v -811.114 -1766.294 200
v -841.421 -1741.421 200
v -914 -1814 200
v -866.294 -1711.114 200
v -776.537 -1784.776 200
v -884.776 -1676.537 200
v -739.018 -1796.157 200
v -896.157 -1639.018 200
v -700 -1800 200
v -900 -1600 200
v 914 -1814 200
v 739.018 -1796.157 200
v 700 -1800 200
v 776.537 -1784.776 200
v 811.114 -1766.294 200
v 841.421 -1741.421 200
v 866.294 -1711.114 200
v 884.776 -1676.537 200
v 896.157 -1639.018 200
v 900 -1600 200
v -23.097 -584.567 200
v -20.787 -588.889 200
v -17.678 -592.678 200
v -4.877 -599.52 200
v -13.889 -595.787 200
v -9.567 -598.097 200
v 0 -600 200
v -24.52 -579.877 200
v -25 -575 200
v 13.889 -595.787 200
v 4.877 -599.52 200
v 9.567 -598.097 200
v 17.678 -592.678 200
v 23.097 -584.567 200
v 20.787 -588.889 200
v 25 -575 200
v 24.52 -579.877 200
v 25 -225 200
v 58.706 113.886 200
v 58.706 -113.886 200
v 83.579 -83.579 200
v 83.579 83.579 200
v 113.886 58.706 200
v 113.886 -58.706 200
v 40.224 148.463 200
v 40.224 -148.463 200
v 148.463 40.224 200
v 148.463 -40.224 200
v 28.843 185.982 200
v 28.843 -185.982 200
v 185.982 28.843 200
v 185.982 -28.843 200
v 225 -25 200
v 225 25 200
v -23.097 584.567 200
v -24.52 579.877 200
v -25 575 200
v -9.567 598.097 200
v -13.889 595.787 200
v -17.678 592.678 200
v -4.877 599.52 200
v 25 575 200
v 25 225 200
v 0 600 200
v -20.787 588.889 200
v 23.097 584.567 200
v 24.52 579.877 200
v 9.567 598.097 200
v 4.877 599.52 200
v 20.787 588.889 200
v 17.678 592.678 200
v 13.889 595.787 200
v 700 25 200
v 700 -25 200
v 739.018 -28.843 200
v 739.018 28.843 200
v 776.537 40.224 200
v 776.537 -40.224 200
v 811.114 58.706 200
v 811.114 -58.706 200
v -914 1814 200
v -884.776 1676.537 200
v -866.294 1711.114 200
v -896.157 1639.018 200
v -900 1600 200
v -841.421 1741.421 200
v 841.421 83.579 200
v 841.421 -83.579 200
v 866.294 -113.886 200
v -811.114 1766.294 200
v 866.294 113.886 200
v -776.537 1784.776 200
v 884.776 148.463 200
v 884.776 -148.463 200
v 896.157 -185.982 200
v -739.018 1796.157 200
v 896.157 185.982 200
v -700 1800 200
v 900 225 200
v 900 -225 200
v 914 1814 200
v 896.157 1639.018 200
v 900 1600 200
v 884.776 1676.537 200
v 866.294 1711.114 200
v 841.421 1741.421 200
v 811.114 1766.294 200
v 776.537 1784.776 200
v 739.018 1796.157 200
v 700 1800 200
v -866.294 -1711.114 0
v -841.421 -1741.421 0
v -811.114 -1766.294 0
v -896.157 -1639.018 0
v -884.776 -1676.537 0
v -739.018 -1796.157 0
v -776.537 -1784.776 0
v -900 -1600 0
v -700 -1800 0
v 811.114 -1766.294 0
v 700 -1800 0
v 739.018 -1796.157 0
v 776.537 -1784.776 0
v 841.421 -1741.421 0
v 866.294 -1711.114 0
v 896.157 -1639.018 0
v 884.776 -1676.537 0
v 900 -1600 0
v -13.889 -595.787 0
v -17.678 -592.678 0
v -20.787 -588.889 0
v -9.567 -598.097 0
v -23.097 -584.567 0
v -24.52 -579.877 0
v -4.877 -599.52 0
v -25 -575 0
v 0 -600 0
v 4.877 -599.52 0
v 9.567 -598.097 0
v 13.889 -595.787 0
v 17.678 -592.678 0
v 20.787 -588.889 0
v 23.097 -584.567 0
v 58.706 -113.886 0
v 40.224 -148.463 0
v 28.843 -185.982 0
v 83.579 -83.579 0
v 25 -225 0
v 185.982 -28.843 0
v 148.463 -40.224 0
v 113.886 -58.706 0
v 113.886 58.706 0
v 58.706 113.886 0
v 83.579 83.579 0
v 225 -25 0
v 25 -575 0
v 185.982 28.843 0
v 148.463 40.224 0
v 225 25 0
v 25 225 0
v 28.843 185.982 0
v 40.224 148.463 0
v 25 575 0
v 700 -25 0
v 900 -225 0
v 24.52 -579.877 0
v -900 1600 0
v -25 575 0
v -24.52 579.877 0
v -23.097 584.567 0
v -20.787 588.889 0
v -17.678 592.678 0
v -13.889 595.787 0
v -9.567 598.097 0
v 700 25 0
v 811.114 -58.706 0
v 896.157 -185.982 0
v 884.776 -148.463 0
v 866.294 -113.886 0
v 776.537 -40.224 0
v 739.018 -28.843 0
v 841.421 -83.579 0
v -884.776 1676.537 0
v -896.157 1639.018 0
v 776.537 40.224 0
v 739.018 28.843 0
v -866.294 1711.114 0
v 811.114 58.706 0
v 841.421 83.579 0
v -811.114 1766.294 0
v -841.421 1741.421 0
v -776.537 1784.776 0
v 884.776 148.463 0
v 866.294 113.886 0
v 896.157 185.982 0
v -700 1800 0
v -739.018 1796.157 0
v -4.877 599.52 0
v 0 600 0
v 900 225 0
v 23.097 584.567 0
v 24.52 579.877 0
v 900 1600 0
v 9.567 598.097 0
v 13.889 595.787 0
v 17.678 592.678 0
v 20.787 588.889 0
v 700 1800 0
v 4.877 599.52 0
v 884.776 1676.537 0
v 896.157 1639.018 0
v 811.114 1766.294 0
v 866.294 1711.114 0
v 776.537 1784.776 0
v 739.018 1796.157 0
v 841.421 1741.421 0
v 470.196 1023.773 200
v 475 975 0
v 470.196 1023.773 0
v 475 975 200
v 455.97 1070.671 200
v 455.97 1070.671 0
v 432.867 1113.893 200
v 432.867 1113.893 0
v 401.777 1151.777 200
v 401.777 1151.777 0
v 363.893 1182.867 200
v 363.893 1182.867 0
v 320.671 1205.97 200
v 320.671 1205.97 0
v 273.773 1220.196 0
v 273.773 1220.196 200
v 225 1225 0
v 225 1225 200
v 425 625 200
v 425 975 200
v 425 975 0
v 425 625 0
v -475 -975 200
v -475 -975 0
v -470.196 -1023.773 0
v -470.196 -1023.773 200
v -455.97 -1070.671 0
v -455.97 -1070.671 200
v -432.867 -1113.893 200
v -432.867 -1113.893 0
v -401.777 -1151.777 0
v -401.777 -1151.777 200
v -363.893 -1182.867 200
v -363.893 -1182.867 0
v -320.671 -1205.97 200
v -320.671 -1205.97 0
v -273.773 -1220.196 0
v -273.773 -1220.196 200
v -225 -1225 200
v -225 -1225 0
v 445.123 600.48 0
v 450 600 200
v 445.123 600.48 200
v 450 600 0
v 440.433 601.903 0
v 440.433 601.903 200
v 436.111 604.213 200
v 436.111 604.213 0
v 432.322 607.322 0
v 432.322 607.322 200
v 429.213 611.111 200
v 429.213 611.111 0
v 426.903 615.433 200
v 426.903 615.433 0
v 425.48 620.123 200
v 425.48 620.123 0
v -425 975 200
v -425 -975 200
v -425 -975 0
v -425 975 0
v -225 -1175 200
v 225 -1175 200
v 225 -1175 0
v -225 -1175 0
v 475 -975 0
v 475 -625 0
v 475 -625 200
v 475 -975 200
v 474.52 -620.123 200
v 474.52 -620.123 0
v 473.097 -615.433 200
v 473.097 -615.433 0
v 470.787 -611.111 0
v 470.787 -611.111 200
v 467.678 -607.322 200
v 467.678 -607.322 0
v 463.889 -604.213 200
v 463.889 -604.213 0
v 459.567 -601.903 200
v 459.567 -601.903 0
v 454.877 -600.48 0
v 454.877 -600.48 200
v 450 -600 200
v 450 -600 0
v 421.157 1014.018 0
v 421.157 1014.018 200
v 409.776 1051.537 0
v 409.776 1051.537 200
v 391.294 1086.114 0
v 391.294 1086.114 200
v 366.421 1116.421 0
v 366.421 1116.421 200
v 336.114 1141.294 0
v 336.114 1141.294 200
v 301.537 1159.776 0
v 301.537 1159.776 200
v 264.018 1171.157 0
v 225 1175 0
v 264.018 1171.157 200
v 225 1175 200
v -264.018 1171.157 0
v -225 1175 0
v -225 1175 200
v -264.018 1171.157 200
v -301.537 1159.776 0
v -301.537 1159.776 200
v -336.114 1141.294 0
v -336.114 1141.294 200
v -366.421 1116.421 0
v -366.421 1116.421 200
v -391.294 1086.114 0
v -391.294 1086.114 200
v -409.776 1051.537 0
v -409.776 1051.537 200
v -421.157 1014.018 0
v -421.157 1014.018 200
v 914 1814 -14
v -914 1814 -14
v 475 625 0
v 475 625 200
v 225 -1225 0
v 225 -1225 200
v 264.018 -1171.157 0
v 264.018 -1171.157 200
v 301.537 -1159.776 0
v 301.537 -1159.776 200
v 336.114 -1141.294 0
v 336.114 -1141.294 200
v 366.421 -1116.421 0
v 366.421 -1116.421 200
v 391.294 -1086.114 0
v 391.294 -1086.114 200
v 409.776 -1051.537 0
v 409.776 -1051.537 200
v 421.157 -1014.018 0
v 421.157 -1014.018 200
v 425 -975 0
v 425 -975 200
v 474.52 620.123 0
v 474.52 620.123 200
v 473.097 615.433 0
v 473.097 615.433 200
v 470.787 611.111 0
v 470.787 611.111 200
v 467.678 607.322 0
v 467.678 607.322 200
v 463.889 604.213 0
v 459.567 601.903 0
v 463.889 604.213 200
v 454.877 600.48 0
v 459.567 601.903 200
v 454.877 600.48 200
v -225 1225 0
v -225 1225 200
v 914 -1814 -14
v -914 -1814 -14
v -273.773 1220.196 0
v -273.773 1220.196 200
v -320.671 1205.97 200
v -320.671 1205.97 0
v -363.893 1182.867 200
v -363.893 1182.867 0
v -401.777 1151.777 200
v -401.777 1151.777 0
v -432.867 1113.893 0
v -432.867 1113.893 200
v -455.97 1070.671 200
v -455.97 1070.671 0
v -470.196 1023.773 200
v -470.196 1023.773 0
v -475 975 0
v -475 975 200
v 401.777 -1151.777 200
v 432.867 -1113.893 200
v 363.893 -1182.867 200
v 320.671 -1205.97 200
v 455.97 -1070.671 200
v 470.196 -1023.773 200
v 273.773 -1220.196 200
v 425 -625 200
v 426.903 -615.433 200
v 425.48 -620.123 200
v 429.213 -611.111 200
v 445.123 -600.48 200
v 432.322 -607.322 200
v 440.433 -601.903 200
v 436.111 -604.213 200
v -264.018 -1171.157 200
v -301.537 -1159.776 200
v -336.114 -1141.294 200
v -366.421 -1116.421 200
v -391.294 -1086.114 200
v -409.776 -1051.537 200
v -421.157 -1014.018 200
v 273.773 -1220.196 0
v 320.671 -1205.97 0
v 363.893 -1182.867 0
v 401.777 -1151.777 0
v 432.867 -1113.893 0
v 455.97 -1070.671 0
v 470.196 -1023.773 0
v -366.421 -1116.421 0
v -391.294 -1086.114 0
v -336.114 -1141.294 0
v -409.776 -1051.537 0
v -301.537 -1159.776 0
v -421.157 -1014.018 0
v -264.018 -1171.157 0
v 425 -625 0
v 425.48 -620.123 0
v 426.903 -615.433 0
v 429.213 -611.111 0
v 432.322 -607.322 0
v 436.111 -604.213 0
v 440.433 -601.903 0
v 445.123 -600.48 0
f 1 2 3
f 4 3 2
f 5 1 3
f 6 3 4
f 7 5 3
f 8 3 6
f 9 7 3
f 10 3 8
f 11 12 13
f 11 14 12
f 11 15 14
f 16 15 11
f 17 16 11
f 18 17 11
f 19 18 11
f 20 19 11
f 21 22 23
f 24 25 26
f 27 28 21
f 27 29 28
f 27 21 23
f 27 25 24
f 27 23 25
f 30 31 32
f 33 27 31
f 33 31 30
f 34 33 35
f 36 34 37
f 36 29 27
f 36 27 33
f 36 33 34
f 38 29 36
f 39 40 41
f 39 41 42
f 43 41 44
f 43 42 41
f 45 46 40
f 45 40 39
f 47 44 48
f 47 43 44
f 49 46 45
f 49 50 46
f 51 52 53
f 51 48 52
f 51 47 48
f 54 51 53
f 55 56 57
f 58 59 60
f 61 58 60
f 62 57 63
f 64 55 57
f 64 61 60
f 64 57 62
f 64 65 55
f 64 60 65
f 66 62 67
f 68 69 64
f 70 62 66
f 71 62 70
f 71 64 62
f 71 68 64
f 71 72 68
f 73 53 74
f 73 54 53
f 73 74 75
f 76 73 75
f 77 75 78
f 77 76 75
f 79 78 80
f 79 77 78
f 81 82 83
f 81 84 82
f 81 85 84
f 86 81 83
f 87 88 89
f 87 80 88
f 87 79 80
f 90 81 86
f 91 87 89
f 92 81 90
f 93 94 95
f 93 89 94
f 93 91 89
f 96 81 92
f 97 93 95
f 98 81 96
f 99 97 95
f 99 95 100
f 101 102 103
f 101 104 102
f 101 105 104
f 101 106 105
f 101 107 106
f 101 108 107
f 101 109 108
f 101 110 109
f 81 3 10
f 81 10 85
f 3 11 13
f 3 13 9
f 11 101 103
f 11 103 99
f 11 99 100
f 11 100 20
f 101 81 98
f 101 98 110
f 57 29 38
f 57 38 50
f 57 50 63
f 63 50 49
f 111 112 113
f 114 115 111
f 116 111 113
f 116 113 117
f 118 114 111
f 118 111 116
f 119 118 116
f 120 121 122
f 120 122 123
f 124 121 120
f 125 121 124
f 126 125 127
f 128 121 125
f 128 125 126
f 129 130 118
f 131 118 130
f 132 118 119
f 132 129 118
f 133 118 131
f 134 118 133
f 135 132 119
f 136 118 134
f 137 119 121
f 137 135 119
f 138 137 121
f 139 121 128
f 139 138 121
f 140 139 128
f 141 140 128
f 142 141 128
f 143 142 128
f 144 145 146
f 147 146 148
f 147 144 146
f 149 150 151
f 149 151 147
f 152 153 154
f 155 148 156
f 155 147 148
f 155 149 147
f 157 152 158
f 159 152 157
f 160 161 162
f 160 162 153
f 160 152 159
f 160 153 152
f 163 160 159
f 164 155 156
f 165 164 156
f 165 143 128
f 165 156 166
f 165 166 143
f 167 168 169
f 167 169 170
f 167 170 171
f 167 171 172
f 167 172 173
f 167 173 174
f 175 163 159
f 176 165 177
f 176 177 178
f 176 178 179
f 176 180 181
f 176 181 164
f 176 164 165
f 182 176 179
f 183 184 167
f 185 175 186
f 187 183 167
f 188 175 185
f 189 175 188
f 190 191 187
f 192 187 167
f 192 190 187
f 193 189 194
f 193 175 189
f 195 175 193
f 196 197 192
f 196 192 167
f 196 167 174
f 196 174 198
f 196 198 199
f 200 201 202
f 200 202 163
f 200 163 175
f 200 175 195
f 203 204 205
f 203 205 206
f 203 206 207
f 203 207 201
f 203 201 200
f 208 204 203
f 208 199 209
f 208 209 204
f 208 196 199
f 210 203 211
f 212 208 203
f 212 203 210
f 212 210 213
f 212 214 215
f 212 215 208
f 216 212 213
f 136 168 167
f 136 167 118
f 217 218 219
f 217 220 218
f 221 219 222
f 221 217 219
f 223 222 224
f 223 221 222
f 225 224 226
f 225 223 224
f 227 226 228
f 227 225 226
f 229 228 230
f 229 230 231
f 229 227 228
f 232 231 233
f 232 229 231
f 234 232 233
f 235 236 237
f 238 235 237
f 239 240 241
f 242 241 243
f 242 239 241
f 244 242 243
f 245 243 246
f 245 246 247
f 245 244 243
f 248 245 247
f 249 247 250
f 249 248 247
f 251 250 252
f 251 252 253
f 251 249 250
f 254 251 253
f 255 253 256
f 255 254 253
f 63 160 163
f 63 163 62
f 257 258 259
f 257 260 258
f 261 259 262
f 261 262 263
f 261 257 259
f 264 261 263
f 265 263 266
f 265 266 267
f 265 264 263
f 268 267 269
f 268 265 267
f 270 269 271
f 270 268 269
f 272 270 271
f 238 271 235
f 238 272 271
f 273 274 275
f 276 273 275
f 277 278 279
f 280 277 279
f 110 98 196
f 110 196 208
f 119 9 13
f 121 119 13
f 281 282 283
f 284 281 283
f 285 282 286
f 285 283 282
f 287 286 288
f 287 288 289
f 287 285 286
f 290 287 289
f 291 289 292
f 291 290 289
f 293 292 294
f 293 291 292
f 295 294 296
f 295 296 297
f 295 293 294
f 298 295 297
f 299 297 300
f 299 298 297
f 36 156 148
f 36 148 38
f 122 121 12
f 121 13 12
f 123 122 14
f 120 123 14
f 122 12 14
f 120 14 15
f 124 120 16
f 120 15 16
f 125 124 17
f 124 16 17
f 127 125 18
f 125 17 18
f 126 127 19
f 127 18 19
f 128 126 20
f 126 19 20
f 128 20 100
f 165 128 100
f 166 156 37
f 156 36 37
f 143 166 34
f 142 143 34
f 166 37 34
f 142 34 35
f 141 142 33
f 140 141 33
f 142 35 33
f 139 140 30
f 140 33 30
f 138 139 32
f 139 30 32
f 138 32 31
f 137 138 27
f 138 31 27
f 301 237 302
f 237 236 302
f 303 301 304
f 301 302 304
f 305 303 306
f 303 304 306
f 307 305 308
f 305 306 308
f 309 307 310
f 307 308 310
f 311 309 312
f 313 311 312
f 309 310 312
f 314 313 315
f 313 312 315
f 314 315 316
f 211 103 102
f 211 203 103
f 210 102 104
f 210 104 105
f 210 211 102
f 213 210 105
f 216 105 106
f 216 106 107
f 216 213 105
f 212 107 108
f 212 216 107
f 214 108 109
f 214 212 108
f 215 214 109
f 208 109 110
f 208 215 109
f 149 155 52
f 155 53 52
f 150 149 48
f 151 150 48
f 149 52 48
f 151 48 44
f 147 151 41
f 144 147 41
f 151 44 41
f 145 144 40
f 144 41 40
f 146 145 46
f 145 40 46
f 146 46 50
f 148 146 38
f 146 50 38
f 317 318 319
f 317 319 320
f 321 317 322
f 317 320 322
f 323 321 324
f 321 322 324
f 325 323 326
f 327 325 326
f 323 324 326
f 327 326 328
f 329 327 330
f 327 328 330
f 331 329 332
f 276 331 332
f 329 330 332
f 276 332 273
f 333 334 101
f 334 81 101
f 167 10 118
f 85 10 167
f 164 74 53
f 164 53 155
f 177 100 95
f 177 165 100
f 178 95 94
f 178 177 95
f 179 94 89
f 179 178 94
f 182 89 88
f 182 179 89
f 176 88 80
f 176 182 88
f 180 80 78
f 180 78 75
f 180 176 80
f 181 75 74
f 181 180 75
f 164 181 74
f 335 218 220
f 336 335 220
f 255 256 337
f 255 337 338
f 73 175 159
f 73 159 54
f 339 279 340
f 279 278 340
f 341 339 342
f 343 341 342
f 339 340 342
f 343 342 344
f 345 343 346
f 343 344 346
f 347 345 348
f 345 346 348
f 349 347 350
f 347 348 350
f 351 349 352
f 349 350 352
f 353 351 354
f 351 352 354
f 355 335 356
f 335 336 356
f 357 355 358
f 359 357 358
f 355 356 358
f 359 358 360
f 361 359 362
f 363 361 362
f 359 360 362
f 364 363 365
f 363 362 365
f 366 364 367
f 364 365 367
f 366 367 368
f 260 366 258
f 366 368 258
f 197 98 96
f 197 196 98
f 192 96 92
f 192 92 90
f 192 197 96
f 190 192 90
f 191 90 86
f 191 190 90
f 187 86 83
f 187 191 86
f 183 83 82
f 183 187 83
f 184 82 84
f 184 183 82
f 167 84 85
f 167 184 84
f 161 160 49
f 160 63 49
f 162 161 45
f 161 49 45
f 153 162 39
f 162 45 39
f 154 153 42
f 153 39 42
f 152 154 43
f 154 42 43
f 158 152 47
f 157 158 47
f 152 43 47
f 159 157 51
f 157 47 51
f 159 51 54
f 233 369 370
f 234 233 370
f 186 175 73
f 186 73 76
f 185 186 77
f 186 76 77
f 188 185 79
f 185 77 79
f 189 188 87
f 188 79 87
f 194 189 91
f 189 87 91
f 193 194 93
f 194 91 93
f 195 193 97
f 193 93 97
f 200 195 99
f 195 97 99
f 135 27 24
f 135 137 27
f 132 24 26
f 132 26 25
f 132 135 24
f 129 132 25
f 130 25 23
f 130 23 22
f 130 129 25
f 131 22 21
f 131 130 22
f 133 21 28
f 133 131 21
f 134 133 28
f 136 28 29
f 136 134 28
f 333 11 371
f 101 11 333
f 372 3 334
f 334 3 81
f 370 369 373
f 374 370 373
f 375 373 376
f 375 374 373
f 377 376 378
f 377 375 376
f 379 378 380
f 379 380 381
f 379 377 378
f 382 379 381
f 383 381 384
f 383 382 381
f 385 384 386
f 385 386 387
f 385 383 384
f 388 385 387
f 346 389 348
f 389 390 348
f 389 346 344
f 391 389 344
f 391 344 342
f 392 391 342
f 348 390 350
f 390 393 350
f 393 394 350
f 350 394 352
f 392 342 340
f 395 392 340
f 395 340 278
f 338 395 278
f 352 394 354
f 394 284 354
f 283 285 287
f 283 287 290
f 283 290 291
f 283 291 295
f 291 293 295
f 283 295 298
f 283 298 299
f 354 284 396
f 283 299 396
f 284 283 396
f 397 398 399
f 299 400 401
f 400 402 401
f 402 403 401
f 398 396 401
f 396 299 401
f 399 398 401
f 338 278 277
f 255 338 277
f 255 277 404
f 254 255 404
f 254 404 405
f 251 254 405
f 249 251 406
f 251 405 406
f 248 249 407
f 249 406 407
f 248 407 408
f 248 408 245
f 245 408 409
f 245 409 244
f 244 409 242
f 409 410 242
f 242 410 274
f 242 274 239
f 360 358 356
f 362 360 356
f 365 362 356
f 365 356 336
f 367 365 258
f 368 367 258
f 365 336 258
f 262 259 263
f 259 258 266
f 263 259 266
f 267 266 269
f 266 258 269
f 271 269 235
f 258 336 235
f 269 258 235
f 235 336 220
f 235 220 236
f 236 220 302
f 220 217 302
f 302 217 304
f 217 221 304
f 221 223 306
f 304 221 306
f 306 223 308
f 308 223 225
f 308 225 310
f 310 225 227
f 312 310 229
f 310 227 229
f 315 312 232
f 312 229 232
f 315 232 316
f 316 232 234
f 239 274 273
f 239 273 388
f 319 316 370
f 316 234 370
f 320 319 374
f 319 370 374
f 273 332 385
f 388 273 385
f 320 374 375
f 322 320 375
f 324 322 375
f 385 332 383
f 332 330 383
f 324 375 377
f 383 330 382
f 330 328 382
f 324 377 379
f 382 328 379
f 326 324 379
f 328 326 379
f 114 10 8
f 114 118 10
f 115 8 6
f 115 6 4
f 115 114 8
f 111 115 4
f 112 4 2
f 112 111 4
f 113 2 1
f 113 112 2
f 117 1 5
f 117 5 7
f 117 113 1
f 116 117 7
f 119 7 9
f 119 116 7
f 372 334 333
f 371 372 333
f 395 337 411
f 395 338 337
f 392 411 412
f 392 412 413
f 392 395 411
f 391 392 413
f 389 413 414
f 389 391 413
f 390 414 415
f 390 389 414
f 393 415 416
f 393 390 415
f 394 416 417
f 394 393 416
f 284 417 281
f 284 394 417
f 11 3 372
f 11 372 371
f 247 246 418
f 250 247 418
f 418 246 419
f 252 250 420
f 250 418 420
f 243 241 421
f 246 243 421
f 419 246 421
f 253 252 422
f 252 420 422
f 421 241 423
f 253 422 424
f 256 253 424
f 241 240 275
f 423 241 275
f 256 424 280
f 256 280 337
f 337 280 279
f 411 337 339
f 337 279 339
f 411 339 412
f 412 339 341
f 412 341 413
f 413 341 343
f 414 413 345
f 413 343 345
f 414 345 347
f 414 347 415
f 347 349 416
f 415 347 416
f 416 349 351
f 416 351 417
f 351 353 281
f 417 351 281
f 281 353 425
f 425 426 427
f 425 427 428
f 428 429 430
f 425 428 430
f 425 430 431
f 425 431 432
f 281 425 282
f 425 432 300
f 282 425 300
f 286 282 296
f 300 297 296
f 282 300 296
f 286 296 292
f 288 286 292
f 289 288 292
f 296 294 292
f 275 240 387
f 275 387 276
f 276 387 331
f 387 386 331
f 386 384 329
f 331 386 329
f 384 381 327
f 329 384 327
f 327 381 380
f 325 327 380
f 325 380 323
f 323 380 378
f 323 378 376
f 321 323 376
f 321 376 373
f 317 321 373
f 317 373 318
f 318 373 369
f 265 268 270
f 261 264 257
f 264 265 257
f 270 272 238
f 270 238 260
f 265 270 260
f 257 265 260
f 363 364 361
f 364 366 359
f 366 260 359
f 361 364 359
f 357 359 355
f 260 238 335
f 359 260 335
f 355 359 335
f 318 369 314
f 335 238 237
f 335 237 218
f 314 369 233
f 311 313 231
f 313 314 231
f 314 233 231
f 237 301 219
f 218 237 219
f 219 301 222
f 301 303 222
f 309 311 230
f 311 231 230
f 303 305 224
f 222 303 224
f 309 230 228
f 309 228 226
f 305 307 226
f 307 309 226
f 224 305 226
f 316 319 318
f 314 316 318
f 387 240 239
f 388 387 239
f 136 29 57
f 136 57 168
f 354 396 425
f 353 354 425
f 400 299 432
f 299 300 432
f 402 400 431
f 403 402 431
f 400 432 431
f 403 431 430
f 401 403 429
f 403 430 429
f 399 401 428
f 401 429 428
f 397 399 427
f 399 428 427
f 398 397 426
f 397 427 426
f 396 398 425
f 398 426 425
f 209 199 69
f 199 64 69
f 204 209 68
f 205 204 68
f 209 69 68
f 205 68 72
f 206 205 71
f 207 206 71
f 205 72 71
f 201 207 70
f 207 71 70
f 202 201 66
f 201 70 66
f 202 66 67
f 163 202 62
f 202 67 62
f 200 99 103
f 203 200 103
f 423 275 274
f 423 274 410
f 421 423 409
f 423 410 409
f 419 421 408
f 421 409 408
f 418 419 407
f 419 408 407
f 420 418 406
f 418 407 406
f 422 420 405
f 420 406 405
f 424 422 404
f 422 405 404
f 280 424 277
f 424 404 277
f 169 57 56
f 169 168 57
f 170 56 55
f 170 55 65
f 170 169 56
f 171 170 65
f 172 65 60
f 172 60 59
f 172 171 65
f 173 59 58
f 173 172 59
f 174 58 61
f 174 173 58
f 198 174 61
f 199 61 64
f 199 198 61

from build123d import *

# Parameters (mm, degrees)
F6_W          = 1828
F6_H          = 3628
F7_DEPTH      = 200
F7_DEPTH_BACK = 14
F8_T          = -14
F11_W         = 50
F11_H         = 200
F16_R         = 200
F16_2_R       = 200
F17_R         = 250
F18_R         = 24.99999
F18_2_R       = 24.99999


# Not quite as in the source:
# - a fillet or chamfer is up to 0.001 mm smaller than in the source, because OpenCascade refuses the exact size


with BuildPart() as f7:
    # F6 (on Top) → F7 (new body, two sides)
    with BuildSketch(Plane.XY) as f7_sk:
        Rectangle(F6_W, F6_H)
    extrude(amount=F7_DEPTH)
    extrude(f7_sk.sketch, amount=-F7_DEPTH_BACK)

    # F8
    f8_openings = [f7.faces().sort_by_distance(p)[0] for p in [
        (0, 0, 200),
    ]]
    offset(amount=F8_T, openings=f8_openings)


with BuildPart() as f12:
    # F12: sweep along a path in F9
    with BuildLine(Plane.XY) as f12_path:
        Line((450, 600), (450, 1200))
        Line((450, 1200), (-450, 1200))
        Line((-450, 1200), (-450, 0))
        Line((-450, 0), (-450, -1200))
        Line((-450, -1200), (450, -1200))
        Line((450, -1200), (450, -600))
    # F11 (on plane+point) → F12 (sweep)
    with BuildSketch(Plane.XZ.offset(-600)):
        with Locations((450, 100)):
            Rectangle(F11_W, F11_H)
    sweep(path=f12_path.line, transition=Transition.RIGHT)

    # F16
    f16_edges = [f12.edges().sort_by_distance(p)[0] for p in [
        (-425, 1175, 100),
        (425, 1175, 100),
        (-425, -1175, 100),
        (425, -1175, 100),
    ]]
    fillet(f16_edges, radius=F16_R)

    # F17
    f17_edges = [f12.edges().sort_by_distance(p)[0] for p in [
        (-475, 1225, 100),
        (475, 1225, 100),
        (-475, -1225, 100),
        (475, -1225, 100),
    ]]
    fillet(f17_edges, radius=F17_R)

    # F18 (radius 25 in the source; OpenCascade refuses exactly that, so slightly less here)
    f18_edges = [f12.edges().sort_by_distance(p)[0] for p in [
        (425, 600, 100),
        (475, 600, 100),
        (425, -600, 100),
        (475, -600, 100),
    ]]
    fillet(f18_edges, radius=F18_R)


with BuildPart() as f13:
    # F13: sweep along a path in F9
    with BuildLine(Plane.XY) as f13_path:
        Line((0, 600), (0, 0))
        Line((0, 0), (900, 0))
    # F11 (on plane+point) → F13 (sweep)
    with BuildSketch(Plane.XZ.offset(-600)):
        with Locations((0, 100)):
            Rectangle(F11_W, F11_H)
    sweep(path=f13_path.line, transition=Transition.RIGHT)


with BuildPart() as f14:
    # F14: sweep along a path in F9
    with BuildLine(Plane.XY) as f14_path:
        Line((0, 600), (0, 0))
        Line((0, 0), (0, -600))
    # F11 (on plane+point) → F14 (sweep)
    with BuildSketch(Plane.XZ.offset(-600)):
        with Locations((0, 100)):
            Rectangle(F11_W, F11_H)
    sweep(path=f14_path.line)


with BuildPart() as f7_1:
    add(f7.part)

    # F15: union F13, F14
    add(f13.part)
    add(f14.part)

    # F16#2
    f16_2_edges = [f7_1.edges().sort_by_distance(p)[0] for p in [
        (25, 25, 100),
        (25, -25, 100),
        (900, -1800, 100),
        (-900, -1800, 100),
        (-900, 1800, 100),
        (900, 1800, 100),
        (900, -25, 100),
        (900, 25, 100),
    ]]
    fillet(f16_2_edges, radius=F16_2_R)

    # F18#2 (radius 25 in the source; OpenCascade refuses exactly that, so slightly less here)
    f18_2_edges = [f7_1.edges().sort_by_distance(p)[0] for p in [
        (-25, 600, 100),
        (25, 600, 100),
        (-25, -600, 100),
        (25, -600, 100),
    ]]
    fillet(f18_2_edges, radius=F18_2_R)


solid = Compound([f12.part, f7_1.part])
